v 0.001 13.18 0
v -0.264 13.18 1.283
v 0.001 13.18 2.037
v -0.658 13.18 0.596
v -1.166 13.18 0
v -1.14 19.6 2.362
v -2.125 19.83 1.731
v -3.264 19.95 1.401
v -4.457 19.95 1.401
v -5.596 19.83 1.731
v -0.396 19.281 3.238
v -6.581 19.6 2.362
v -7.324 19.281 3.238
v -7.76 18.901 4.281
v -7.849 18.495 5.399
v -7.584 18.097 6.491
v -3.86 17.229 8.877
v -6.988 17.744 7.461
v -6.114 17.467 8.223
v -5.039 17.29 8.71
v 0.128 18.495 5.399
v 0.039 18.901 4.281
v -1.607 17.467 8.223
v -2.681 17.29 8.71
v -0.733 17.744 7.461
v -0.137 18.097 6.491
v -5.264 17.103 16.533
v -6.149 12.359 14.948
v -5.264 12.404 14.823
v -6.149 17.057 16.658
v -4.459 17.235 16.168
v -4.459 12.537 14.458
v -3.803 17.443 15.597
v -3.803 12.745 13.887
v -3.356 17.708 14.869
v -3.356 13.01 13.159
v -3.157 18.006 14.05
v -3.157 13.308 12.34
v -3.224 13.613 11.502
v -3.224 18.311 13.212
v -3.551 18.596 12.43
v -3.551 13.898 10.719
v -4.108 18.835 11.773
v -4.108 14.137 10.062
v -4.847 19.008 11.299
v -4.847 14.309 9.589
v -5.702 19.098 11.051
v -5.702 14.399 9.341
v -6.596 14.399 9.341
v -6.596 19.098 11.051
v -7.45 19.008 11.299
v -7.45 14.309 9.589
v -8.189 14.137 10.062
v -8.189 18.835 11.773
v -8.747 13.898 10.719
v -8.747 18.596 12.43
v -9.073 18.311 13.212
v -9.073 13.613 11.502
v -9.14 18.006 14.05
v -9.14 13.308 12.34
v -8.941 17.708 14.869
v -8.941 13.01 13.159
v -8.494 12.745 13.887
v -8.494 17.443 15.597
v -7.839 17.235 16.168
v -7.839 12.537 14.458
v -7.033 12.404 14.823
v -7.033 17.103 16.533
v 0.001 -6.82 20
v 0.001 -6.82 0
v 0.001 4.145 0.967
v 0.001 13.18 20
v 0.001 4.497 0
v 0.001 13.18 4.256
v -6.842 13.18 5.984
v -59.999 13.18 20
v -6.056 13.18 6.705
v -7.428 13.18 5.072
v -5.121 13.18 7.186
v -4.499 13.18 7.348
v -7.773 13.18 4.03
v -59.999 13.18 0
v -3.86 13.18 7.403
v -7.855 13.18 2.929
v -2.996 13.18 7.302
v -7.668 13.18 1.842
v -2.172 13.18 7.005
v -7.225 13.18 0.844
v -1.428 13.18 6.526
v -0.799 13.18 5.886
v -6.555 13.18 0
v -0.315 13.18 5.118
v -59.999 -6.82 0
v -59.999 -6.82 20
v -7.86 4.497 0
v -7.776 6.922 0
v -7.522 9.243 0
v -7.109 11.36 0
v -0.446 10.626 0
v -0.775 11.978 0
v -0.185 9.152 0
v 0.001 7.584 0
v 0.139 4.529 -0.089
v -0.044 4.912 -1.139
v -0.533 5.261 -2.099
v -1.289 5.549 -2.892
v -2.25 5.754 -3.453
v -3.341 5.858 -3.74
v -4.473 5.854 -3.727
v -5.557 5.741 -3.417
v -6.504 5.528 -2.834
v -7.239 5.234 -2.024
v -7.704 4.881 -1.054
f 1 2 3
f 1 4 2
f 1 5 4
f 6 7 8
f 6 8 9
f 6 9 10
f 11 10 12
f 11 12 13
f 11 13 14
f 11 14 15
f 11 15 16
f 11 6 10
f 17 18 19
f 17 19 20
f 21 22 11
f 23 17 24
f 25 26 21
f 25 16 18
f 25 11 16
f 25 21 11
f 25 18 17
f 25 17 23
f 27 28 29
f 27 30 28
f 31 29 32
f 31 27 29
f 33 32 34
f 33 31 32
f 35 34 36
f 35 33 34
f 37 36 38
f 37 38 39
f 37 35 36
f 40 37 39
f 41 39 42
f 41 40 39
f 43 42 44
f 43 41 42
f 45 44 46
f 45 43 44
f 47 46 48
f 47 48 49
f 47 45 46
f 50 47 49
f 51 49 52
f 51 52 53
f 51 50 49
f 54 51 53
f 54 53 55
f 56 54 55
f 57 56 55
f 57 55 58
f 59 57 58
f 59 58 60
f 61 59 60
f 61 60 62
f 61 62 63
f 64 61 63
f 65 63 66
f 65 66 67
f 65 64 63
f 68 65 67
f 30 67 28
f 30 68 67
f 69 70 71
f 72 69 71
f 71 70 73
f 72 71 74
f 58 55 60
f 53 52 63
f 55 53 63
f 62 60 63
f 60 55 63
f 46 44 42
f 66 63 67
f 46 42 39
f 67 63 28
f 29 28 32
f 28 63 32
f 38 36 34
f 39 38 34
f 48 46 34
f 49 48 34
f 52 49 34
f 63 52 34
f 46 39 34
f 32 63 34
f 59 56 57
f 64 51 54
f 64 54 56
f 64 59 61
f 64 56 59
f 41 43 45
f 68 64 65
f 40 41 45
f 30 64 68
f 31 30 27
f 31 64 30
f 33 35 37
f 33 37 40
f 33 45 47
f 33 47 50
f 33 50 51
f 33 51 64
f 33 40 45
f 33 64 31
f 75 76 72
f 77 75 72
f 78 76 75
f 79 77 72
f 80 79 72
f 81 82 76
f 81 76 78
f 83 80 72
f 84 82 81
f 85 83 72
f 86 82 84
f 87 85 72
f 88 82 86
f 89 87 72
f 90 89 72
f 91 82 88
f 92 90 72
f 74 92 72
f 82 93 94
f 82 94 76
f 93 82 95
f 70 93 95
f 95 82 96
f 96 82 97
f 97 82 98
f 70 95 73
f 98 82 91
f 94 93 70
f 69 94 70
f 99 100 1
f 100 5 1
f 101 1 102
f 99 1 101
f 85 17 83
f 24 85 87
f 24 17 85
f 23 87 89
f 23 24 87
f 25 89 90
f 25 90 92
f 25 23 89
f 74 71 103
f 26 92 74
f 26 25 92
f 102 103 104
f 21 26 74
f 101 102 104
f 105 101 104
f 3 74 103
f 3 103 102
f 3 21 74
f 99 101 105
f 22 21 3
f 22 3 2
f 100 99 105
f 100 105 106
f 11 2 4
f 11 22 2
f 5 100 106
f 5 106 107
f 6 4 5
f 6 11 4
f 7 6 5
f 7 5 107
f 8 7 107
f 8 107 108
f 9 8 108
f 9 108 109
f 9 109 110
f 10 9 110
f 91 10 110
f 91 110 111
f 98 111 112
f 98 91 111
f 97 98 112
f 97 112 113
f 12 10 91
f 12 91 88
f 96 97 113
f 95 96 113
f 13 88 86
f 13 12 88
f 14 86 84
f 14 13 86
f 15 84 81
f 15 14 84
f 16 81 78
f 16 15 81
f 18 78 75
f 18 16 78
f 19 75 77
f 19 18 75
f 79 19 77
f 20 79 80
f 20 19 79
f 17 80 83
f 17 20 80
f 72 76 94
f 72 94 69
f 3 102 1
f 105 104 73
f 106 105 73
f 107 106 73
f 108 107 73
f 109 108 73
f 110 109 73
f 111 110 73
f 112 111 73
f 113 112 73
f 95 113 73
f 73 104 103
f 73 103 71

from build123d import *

# Parameters (mm, degrees)
SKETCH1_W           = 60
SKETCH1_H           = 20
BOSS_EXTRUDE1_DEPTH = 20
SKETCH5_R           = 4
BOSS_EXTRUDE5_DEPTH = 15
SKETCH4_R           = 3
BOSS_EXTRUDE4_DEPTH = 2.5


with BuildPart() as part:
    # Sketch1 → Boss-Extrude1 (new body)
    with BuildSketch(Plane.XY):
        with Locations((-29.998619437, 3.180300826)):
            Rectangle(SKETCH1_W, SKETCH1_H)
    extrude(amount=BOSS_EXTRUDE1_DEPTH)

    # Sketch5 → Boss-Extrude5 (add)
    with BuildSketch(Plane(origin=(0, 18.066374613, 6.5756226), x_dir=(-1, 0, 0), z_dir=(0, 0.9396926207859081, 0.34202014332566943))):
        with Locations(Location((3.860358384, -1.55145078, 0), (0, 0, 90))):
            Circle(SKETCH5_R)
    extrude(amount=-BOSS_EXTRUDE5_DEPTH)


with BuildPart() as body_2:
    # Sketch4 → Boss-Extrude4 (new, symmetric)
    with BuildSketch(Plane(origin=(0, 18.066374613, 6.5756226), x_dir=(-1, 0, 0), z_dir=(0, 0.9396926207859081, 0.34202014332566943))):
        with Locations(Location((6.148675579, 6.819695783, 0), (0, 0, 90))):
            Circle(SKETCH4_R)
    extrude(amount=BOSS_EXTRUDE4_DEPTH, both=True)


solid = Compound([part.part, body_2.part])
